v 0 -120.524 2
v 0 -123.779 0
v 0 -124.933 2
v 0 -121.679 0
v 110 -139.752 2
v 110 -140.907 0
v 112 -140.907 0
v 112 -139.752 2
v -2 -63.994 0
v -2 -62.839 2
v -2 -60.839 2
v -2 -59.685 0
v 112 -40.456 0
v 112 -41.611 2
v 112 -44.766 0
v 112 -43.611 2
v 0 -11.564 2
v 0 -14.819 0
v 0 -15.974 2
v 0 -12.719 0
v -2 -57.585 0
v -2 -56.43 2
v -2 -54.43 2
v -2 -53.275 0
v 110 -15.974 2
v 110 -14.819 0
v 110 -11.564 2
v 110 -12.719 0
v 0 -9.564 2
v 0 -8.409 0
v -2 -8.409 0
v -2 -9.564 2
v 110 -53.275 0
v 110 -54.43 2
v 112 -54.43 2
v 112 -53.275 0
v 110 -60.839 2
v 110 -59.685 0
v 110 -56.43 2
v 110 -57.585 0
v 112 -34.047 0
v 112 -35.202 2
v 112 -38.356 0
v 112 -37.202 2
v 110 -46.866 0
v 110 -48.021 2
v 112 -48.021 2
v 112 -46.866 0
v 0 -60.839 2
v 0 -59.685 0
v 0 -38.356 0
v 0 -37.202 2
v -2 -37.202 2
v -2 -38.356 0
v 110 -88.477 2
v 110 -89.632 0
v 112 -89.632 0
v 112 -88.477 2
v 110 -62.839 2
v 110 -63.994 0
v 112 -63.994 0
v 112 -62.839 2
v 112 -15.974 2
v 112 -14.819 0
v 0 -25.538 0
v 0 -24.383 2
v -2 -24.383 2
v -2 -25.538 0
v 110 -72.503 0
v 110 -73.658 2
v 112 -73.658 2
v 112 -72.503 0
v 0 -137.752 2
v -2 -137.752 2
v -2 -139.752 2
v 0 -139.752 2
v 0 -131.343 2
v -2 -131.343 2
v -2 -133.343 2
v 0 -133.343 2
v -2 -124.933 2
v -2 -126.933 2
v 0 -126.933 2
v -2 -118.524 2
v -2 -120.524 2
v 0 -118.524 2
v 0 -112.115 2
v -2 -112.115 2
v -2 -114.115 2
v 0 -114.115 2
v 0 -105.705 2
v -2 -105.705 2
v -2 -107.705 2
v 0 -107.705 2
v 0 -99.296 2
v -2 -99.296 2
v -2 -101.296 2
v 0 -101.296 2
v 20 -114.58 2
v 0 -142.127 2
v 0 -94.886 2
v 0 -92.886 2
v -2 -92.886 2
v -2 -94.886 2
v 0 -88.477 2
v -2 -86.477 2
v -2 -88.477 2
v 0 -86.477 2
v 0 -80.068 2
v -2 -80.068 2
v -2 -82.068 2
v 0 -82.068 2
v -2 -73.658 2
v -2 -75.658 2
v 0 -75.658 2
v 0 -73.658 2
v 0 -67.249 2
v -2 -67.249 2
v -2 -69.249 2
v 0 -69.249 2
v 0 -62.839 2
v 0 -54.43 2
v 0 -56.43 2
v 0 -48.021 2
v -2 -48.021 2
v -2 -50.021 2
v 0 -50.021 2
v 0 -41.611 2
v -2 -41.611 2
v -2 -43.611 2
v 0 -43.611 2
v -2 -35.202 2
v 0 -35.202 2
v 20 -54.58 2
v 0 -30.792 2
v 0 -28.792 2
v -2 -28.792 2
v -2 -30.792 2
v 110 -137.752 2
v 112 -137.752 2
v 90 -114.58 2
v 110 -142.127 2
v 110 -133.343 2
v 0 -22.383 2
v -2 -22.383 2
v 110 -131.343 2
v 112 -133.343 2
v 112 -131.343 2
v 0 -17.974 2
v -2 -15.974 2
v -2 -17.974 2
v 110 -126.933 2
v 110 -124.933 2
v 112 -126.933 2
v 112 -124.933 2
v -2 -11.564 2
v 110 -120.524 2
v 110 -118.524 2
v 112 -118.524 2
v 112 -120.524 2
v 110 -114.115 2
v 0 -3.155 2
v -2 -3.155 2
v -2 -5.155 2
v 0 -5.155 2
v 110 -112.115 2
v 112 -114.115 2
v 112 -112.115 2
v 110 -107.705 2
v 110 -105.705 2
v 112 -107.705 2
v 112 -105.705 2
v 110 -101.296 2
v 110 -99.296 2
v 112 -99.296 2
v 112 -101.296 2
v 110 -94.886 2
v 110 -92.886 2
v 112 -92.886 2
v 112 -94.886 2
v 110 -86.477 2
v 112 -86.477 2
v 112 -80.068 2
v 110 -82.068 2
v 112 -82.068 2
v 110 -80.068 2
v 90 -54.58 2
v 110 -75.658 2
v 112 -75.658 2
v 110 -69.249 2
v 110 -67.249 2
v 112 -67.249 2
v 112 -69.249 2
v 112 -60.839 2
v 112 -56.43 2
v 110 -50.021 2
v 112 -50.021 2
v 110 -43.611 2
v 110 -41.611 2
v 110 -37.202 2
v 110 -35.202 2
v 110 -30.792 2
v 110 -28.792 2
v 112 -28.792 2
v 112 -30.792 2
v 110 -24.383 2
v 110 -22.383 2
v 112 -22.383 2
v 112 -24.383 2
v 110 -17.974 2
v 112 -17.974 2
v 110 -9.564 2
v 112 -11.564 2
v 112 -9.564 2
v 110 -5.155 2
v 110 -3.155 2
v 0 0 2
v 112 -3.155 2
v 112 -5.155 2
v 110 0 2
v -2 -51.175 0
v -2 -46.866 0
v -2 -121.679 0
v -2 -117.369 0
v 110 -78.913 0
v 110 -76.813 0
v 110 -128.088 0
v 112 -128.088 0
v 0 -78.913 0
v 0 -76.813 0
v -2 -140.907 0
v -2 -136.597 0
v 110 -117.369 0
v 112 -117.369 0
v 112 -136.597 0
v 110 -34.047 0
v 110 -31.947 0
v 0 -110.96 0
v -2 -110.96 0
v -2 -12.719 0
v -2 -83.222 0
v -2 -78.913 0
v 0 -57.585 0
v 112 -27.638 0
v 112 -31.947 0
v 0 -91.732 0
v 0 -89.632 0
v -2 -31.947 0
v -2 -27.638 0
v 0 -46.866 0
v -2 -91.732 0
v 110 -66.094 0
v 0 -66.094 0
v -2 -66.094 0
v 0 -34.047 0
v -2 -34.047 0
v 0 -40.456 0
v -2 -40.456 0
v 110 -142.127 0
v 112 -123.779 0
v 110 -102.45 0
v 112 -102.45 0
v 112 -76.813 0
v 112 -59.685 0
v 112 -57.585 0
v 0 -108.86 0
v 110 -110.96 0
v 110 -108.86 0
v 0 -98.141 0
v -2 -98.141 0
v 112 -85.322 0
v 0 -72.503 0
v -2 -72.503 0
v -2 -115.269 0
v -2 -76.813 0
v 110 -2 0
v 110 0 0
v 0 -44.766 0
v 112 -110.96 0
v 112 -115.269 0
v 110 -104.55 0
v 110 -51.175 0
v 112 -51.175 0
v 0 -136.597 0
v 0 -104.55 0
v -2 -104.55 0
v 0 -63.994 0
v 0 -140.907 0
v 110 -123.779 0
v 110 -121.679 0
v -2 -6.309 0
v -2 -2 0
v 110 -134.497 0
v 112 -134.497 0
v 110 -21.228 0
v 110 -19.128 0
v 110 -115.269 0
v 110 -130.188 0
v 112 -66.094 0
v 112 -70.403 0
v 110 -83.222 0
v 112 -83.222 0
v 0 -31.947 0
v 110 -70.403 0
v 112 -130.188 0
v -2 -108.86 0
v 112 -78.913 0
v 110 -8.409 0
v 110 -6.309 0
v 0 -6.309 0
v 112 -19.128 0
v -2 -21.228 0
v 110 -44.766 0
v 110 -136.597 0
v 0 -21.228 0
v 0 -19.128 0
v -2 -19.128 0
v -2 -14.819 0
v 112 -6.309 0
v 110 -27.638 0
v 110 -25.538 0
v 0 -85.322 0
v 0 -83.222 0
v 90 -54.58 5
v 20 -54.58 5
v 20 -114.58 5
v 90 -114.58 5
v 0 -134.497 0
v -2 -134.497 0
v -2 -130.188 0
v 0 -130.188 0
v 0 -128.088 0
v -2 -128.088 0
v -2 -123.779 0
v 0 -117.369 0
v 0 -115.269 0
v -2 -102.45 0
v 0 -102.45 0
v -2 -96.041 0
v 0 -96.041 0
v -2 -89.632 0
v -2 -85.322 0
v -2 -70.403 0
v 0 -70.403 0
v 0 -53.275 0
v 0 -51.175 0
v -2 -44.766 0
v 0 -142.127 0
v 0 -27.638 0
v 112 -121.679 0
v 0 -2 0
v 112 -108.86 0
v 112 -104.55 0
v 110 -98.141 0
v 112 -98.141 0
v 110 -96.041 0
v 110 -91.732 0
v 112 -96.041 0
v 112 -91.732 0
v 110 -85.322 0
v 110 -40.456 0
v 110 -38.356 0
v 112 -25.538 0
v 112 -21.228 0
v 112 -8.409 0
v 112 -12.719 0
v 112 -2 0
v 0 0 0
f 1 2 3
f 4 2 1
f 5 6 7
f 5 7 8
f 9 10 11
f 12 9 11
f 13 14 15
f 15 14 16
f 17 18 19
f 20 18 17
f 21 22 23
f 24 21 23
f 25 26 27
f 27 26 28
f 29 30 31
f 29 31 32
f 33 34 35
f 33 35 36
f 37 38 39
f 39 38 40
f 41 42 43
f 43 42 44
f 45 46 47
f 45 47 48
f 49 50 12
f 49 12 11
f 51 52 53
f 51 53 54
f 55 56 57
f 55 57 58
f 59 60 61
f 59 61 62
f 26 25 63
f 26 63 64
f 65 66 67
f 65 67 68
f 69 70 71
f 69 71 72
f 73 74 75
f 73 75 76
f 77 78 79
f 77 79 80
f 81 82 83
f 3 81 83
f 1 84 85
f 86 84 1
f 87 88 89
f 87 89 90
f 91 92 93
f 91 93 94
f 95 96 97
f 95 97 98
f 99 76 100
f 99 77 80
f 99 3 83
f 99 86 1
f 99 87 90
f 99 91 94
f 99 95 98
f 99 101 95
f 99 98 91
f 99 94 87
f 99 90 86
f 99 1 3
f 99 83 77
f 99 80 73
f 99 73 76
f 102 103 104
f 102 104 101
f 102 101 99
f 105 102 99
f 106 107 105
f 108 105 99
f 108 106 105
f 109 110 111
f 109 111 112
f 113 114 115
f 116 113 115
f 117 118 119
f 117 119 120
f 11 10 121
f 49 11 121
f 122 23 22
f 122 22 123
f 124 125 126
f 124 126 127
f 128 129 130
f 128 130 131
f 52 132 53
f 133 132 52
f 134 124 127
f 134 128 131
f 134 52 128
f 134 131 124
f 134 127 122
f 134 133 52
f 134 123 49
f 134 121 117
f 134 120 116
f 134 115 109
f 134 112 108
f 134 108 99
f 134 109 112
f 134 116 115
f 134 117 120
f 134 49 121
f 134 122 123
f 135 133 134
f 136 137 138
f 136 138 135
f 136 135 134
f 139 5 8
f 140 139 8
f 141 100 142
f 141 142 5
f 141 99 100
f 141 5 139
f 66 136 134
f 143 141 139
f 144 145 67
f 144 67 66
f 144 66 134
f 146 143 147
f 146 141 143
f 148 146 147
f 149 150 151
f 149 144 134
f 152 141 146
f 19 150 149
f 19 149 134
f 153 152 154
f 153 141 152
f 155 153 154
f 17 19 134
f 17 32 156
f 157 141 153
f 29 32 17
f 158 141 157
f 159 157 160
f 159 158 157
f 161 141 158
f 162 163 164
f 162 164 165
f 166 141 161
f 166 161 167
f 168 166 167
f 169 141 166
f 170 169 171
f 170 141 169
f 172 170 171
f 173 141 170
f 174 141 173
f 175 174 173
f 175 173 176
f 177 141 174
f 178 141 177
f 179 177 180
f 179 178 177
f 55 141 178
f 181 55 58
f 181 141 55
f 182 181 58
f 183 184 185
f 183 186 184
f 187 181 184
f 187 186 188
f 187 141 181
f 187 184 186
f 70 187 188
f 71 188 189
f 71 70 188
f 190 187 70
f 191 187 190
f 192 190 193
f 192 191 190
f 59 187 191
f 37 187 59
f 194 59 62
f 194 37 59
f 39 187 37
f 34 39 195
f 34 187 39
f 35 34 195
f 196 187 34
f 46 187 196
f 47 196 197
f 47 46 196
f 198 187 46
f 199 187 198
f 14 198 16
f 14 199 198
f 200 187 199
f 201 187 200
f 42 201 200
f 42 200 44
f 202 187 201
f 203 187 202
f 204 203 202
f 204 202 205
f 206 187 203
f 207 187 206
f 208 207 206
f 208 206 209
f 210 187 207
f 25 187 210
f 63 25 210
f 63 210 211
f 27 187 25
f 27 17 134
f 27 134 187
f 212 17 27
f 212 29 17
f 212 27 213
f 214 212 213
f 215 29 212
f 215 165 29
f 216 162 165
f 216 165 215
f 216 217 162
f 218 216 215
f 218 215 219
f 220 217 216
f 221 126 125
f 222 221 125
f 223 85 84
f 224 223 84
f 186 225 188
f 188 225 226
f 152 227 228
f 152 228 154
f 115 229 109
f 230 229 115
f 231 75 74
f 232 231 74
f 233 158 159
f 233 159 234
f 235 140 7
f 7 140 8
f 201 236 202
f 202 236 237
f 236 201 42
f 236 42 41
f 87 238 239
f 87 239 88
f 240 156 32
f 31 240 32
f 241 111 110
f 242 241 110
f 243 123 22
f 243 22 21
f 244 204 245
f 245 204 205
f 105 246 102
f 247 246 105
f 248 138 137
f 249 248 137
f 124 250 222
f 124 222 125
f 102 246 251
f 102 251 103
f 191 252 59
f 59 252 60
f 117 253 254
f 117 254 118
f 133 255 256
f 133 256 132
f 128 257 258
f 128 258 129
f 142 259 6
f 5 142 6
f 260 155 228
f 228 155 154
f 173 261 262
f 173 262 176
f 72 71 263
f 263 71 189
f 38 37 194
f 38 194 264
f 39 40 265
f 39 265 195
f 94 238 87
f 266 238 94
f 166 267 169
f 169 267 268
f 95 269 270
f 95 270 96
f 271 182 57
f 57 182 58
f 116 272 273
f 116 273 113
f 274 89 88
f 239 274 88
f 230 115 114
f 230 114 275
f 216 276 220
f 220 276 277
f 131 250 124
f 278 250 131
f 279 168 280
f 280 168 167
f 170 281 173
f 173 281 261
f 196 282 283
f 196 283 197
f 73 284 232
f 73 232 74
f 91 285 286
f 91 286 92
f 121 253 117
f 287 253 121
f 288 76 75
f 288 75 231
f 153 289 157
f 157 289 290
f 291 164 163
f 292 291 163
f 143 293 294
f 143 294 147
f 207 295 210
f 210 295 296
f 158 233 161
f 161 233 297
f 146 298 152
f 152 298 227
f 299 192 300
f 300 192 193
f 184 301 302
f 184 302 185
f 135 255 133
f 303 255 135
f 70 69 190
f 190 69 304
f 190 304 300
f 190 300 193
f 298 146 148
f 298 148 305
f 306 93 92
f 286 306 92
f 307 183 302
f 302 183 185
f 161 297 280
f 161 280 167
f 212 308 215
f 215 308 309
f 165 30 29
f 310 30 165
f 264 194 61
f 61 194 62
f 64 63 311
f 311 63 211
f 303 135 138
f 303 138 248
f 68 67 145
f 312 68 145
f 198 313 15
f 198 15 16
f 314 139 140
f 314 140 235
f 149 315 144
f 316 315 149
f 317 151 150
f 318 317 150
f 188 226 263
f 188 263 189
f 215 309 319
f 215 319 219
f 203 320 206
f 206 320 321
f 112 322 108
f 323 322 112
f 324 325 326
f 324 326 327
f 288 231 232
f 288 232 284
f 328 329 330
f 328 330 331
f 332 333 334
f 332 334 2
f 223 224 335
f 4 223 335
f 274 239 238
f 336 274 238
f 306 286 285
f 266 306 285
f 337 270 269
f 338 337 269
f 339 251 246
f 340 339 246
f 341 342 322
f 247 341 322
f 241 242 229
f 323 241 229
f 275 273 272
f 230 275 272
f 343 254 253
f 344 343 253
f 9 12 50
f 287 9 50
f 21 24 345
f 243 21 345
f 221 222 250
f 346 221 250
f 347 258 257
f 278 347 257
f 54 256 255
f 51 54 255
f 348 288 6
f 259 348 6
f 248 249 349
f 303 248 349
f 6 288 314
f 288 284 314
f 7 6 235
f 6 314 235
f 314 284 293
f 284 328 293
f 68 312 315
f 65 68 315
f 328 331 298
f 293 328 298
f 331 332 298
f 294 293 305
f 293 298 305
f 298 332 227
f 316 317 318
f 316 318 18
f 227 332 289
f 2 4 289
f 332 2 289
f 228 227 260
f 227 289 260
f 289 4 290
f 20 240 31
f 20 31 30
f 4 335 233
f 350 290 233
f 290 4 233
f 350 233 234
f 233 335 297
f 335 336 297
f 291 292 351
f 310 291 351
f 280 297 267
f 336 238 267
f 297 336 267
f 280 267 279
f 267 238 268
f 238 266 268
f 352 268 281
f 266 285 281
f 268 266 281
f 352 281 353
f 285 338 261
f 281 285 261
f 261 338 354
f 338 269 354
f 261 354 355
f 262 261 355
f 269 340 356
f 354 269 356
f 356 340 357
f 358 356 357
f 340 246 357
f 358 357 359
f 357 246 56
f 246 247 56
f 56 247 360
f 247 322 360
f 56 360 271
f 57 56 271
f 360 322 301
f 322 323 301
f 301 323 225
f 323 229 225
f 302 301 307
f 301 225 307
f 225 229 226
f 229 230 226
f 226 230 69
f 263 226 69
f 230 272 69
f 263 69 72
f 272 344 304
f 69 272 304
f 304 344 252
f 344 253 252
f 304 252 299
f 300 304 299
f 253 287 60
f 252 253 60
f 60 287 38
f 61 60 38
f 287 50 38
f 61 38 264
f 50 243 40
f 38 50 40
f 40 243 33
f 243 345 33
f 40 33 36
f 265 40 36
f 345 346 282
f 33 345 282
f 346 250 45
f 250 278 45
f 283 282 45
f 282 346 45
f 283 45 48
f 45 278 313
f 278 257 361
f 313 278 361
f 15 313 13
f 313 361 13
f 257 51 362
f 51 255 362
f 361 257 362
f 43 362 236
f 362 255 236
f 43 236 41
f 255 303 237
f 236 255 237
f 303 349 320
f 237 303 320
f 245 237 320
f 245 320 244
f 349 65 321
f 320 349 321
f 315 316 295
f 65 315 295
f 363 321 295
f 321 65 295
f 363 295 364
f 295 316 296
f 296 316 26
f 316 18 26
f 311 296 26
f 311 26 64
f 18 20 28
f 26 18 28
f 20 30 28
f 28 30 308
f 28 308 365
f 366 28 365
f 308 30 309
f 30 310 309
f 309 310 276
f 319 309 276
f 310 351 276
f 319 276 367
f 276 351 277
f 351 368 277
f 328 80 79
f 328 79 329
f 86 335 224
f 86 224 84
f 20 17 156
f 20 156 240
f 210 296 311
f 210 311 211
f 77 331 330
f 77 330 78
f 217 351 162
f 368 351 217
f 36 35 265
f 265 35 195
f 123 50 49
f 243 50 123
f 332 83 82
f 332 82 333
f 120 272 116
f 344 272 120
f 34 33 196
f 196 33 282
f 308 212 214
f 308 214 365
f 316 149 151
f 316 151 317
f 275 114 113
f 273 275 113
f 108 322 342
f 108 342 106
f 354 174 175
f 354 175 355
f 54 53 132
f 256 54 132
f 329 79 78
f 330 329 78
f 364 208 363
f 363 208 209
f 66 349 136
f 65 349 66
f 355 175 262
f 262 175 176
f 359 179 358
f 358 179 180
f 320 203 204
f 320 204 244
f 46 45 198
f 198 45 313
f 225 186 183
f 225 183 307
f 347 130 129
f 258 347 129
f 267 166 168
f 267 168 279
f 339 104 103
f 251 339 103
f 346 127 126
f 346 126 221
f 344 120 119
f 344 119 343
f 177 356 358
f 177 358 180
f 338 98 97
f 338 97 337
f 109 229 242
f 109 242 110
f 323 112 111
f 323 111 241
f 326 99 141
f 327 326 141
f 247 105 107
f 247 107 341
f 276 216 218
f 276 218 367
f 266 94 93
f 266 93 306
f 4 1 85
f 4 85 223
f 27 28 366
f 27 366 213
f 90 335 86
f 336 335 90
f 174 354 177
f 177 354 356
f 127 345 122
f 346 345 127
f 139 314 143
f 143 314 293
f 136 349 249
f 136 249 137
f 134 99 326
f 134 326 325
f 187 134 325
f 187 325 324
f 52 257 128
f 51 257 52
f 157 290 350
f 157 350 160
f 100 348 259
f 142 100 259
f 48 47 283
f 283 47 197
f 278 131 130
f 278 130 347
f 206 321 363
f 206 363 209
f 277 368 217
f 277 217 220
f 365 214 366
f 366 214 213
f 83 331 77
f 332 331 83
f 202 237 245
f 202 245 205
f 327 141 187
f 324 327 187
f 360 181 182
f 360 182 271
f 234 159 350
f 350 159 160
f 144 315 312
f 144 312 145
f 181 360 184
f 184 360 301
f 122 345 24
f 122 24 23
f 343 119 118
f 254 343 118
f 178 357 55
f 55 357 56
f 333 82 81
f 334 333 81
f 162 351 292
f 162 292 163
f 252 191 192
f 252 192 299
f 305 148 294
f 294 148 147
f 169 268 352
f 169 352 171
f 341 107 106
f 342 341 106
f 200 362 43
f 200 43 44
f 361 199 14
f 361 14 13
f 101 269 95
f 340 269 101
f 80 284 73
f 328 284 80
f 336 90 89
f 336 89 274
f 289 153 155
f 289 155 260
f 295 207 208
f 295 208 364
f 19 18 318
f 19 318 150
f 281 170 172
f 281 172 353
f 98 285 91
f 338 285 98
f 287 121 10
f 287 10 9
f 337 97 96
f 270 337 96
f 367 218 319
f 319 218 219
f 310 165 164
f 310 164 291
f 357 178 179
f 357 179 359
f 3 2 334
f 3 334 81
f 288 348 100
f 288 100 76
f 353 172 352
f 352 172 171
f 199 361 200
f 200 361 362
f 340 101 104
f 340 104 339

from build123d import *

# Parameters (mm, degrees)
SKETCH_W               = 110
SKETCH_H               = 142.126704
PAD_DEPTH              = 2
SKETCH001_W            = 70
SKETCH001_H            = 60
PAD001_DEPTH           = 3
PAD002_DEPTH           = 2
LINEARPATTERN_COUNT    = 22
LINEARPATTERN_PITCH    = 6.409401
PAD003_DEPTH           = 2
LINEARPATTERN001_COUNT = 22
LINEARPATTERN001_PITCH = 6.409401


with BuildPart() as part:
    # Sketch → Pad (new body)
    with BuildSketch(Plane.XY):
        with Locations((55, -71.063352)):
            Rectangle(SKETCH_W, SKETCH_H)
    extrude(amount=PAD_DEPTH)

    # Sketch001 (on Face6 of Pad) → Pad001 (join)
    with BuildSketch(Plane.XY.offset(2)):
        with Locations((55, -84.580159)):
            Rectangle(SKETCH001_W, SKETCH001_H)
    extrude(amount=PAD001_DEPTH)

    # Sketch002 (on Face3 of Pad001) → Pad002 (join)
    with BuildSketch(Plane.YZ.offset(110)):
        Polygon((-6.309401, 0), (-5.154701, 2), (-3.154701, 2), (-2, 0), align=None)
    pad002 = extrude(amount=PAD002_DEPTH)

    # LinearPattern: Pad002 ×22
    with Locations(*[(0, -i * LINEARPATTERN_PITCH, 0) for i in range(1, LINEARPATTERN_COUNT)]):
        add(pad002)

    # Sketch003 (on Face2 of LinearPattern) → Pad003 (join)
    with BuildSketch(Plane(origin=(0, 0, 0), x_dir=(0, -1, 0), z_dir=(-1, 0, 0))):
        Polygon((2, 0), (3.154701, 2), (5.154701, 2), (6.309401, 0), align=None)
    pad003 = extrude(amount=PAD003_DEPTH)

    # LinearPattern001: Pad003 ×22
    with Locations(*[(0, -i * LINEARPATTERN001_PITCH, 0) for i in range(1, LINEARPATTERN001_COUNT)]):
        add(pad003)


solid = part.part
